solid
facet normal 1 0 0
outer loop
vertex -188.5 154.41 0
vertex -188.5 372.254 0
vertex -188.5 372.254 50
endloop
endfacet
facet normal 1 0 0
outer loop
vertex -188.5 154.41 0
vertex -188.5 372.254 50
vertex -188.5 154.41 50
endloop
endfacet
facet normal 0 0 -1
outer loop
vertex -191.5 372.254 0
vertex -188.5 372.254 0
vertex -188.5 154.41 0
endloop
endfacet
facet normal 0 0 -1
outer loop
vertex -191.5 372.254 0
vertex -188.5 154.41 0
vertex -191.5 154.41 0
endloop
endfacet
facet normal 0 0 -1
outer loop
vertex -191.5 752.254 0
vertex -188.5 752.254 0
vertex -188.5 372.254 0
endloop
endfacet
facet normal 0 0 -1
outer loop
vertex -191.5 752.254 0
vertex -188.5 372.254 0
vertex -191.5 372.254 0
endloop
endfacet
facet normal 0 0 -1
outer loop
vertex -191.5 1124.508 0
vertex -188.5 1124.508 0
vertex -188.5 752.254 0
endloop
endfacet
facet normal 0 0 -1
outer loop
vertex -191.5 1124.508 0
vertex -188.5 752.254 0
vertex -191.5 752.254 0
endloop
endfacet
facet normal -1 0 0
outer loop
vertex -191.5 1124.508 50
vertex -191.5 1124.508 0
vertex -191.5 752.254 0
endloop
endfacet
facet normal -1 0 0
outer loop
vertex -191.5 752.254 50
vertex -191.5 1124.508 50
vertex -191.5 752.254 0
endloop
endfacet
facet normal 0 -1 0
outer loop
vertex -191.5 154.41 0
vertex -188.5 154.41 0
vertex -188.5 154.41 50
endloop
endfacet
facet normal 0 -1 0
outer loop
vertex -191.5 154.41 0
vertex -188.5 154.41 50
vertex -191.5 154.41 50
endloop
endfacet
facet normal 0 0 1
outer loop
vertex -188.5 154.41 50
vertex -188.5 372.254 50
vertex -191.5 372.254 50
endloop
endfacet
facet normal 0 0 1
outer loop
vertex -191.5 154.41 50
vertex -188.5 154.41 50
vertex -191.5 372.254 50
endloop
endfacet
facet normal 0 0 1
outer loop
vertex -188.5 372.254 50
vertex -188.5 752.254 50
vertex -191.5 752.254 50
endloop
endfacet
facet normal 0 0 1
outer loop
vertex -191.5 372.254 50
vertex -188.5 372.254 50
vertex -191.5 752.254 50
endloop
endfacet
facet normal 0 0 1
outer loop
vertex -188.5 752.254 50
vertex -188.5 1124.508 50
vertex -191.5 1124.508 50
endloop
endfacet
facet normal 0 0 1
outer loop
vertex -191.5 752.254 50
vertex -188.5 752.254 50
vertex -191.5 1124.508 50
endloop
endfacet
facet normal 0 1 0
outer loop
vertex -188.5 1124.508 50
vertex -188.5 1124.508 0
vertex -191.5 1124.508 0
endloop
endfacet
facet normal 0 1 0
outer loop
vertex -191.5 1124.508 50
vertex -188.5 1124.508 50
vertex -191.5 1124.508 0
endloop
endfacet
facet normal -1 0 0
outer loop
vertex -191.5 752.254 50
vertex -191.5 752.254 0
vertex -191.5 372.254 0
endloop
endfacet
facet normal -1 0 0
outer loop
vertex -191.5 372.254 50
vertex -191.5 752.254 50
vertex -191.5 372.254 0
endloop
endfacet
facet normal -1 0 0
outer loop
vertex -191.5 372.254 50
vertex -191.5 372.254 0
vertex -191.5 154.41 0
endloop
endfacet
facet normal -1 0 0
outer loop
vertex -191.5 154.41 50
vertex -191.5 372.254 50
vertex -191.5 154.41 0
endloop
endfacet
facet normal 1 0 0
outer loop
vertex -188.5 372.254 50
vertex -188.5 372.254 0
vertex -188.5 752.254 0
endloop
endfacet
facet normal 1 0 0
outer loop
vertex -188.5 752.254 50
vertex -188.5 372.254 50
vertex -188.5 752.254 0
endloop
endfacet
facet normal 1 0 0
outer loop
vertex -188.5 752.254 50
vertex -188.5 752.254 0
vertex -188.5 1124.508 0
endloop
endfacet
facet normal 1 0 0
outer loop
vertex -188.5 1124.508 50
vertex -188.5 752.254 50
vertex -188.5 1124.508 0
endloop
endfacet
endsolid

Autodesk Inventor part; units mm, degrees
ref_plane "YZ Plane" through (0, 0, 0) normal (1, 0, 0) x (0, 1, 0)
ref_plane "XZ Plane" through (0, 0, 0) normal (0, 1, 0) x (-1, 0, 0)
ref_plane "XY Plane" through (0, 0, 0) normal (0, 0, 1) x (1, 0, 0)
sketch "Sketch1" plane through (0, 0, 0) normal (0, 0, 1) x (1, 0, 0)
  line L0 (-768, 1124.508) -> (768, 1124.508) construction
  line L1 (-98, 0) -> (98, 0) construction
  line L2 (98, 0) -> (768, 1124.508) construction
  line L3 (-98, 0) -> (-768, 1124.508) construction
  line L4 (-190, 752.254) -> (190, 752.254) construction
  line L5 (190, 752.254) -> (190, 372.254) construction
  line L6 (190, 372.254) -> (-190, 372.254) construction
  line L7 (-190, 372.254) -> (-190, 752.254)
  line L8 (0, 1124.508) -> (0, 0) construction
  line L9 (-190, 752.254) -> (-190, 1124.508)
  line L10 (190, 752.254) -> (190, 1124.508) construction
  line L11 (-190, 372.254) -> (-190, 154.41)
  line L12 (190, 372.254) -> (190, 154.41) construction
  line L13 (-190, 752.254) -> (-546.2051, 752.254) construction
  line L14 (-190, 372.254) -> (-319.7949, 372.254) construction
  line L15 (190, 372.254) -> (319.7949, 372.254) construction
  line L16 (190, 752.254) -> (546.2051, 752.254) construction
  line L17 (-585.0411, 817.4352) -> (-581.9487, 812.2451) construction
  point P0 (0, 752.254)
  point P1 (-190, 562.254)
  point P2 (0, 562.254)
  dimension "d0" = 1536
  dimension "d1" = 196
  dimension "d2" = 1308.976
  dimension "d3" = 380
  dimension "d4" = 380
contour flange "Contour Flange1" sketch "Sketch1" thickness 3 bend radius 5 width 50 along (0, 0, 1) mid plane no both sides yes wall seen from (-190, 263.332, 0) lies toward (-1, 0, 0) curves L11 L7 L9
bend "Bend1"
corner "Corner1"
equation "\"d7\" = Thickness"
equation "\"d8\" = BendReliefWidth"
equation "\"d9\" = BendReliefDepth"
equation "\"d10\" = MinimumRemnant"
equation "\"d11\" = TransitionRadius"
equation "\"d13\" = BendRadius"
equation "\"d15\" = CornerReliefSize"
equation "\"d16\" = GapSize"
equation "\"d17\" = JacobiRadiusSize"
equation "\"BendReliefWidth\" = Thickness"
equation "\"BendReliefDepth\" = 0.5 * Thickness"
equation "\"CornerReliefSize\" = 4 * Thickness"
equation "\"MinimumRemnant\" = 2 * Thickness"
equation "\"TransitionRadius\" = BendRadius"
equation "\"JacobiRadiusSize\" = BendRadius"
equation "\"GapSize\" = Thickness"
equation "\"Thickness\" = 3"
equation "\"BendRadius\" = 5"
properties part number "MSC 0692 stringer cone" material "Stainless Steel"
